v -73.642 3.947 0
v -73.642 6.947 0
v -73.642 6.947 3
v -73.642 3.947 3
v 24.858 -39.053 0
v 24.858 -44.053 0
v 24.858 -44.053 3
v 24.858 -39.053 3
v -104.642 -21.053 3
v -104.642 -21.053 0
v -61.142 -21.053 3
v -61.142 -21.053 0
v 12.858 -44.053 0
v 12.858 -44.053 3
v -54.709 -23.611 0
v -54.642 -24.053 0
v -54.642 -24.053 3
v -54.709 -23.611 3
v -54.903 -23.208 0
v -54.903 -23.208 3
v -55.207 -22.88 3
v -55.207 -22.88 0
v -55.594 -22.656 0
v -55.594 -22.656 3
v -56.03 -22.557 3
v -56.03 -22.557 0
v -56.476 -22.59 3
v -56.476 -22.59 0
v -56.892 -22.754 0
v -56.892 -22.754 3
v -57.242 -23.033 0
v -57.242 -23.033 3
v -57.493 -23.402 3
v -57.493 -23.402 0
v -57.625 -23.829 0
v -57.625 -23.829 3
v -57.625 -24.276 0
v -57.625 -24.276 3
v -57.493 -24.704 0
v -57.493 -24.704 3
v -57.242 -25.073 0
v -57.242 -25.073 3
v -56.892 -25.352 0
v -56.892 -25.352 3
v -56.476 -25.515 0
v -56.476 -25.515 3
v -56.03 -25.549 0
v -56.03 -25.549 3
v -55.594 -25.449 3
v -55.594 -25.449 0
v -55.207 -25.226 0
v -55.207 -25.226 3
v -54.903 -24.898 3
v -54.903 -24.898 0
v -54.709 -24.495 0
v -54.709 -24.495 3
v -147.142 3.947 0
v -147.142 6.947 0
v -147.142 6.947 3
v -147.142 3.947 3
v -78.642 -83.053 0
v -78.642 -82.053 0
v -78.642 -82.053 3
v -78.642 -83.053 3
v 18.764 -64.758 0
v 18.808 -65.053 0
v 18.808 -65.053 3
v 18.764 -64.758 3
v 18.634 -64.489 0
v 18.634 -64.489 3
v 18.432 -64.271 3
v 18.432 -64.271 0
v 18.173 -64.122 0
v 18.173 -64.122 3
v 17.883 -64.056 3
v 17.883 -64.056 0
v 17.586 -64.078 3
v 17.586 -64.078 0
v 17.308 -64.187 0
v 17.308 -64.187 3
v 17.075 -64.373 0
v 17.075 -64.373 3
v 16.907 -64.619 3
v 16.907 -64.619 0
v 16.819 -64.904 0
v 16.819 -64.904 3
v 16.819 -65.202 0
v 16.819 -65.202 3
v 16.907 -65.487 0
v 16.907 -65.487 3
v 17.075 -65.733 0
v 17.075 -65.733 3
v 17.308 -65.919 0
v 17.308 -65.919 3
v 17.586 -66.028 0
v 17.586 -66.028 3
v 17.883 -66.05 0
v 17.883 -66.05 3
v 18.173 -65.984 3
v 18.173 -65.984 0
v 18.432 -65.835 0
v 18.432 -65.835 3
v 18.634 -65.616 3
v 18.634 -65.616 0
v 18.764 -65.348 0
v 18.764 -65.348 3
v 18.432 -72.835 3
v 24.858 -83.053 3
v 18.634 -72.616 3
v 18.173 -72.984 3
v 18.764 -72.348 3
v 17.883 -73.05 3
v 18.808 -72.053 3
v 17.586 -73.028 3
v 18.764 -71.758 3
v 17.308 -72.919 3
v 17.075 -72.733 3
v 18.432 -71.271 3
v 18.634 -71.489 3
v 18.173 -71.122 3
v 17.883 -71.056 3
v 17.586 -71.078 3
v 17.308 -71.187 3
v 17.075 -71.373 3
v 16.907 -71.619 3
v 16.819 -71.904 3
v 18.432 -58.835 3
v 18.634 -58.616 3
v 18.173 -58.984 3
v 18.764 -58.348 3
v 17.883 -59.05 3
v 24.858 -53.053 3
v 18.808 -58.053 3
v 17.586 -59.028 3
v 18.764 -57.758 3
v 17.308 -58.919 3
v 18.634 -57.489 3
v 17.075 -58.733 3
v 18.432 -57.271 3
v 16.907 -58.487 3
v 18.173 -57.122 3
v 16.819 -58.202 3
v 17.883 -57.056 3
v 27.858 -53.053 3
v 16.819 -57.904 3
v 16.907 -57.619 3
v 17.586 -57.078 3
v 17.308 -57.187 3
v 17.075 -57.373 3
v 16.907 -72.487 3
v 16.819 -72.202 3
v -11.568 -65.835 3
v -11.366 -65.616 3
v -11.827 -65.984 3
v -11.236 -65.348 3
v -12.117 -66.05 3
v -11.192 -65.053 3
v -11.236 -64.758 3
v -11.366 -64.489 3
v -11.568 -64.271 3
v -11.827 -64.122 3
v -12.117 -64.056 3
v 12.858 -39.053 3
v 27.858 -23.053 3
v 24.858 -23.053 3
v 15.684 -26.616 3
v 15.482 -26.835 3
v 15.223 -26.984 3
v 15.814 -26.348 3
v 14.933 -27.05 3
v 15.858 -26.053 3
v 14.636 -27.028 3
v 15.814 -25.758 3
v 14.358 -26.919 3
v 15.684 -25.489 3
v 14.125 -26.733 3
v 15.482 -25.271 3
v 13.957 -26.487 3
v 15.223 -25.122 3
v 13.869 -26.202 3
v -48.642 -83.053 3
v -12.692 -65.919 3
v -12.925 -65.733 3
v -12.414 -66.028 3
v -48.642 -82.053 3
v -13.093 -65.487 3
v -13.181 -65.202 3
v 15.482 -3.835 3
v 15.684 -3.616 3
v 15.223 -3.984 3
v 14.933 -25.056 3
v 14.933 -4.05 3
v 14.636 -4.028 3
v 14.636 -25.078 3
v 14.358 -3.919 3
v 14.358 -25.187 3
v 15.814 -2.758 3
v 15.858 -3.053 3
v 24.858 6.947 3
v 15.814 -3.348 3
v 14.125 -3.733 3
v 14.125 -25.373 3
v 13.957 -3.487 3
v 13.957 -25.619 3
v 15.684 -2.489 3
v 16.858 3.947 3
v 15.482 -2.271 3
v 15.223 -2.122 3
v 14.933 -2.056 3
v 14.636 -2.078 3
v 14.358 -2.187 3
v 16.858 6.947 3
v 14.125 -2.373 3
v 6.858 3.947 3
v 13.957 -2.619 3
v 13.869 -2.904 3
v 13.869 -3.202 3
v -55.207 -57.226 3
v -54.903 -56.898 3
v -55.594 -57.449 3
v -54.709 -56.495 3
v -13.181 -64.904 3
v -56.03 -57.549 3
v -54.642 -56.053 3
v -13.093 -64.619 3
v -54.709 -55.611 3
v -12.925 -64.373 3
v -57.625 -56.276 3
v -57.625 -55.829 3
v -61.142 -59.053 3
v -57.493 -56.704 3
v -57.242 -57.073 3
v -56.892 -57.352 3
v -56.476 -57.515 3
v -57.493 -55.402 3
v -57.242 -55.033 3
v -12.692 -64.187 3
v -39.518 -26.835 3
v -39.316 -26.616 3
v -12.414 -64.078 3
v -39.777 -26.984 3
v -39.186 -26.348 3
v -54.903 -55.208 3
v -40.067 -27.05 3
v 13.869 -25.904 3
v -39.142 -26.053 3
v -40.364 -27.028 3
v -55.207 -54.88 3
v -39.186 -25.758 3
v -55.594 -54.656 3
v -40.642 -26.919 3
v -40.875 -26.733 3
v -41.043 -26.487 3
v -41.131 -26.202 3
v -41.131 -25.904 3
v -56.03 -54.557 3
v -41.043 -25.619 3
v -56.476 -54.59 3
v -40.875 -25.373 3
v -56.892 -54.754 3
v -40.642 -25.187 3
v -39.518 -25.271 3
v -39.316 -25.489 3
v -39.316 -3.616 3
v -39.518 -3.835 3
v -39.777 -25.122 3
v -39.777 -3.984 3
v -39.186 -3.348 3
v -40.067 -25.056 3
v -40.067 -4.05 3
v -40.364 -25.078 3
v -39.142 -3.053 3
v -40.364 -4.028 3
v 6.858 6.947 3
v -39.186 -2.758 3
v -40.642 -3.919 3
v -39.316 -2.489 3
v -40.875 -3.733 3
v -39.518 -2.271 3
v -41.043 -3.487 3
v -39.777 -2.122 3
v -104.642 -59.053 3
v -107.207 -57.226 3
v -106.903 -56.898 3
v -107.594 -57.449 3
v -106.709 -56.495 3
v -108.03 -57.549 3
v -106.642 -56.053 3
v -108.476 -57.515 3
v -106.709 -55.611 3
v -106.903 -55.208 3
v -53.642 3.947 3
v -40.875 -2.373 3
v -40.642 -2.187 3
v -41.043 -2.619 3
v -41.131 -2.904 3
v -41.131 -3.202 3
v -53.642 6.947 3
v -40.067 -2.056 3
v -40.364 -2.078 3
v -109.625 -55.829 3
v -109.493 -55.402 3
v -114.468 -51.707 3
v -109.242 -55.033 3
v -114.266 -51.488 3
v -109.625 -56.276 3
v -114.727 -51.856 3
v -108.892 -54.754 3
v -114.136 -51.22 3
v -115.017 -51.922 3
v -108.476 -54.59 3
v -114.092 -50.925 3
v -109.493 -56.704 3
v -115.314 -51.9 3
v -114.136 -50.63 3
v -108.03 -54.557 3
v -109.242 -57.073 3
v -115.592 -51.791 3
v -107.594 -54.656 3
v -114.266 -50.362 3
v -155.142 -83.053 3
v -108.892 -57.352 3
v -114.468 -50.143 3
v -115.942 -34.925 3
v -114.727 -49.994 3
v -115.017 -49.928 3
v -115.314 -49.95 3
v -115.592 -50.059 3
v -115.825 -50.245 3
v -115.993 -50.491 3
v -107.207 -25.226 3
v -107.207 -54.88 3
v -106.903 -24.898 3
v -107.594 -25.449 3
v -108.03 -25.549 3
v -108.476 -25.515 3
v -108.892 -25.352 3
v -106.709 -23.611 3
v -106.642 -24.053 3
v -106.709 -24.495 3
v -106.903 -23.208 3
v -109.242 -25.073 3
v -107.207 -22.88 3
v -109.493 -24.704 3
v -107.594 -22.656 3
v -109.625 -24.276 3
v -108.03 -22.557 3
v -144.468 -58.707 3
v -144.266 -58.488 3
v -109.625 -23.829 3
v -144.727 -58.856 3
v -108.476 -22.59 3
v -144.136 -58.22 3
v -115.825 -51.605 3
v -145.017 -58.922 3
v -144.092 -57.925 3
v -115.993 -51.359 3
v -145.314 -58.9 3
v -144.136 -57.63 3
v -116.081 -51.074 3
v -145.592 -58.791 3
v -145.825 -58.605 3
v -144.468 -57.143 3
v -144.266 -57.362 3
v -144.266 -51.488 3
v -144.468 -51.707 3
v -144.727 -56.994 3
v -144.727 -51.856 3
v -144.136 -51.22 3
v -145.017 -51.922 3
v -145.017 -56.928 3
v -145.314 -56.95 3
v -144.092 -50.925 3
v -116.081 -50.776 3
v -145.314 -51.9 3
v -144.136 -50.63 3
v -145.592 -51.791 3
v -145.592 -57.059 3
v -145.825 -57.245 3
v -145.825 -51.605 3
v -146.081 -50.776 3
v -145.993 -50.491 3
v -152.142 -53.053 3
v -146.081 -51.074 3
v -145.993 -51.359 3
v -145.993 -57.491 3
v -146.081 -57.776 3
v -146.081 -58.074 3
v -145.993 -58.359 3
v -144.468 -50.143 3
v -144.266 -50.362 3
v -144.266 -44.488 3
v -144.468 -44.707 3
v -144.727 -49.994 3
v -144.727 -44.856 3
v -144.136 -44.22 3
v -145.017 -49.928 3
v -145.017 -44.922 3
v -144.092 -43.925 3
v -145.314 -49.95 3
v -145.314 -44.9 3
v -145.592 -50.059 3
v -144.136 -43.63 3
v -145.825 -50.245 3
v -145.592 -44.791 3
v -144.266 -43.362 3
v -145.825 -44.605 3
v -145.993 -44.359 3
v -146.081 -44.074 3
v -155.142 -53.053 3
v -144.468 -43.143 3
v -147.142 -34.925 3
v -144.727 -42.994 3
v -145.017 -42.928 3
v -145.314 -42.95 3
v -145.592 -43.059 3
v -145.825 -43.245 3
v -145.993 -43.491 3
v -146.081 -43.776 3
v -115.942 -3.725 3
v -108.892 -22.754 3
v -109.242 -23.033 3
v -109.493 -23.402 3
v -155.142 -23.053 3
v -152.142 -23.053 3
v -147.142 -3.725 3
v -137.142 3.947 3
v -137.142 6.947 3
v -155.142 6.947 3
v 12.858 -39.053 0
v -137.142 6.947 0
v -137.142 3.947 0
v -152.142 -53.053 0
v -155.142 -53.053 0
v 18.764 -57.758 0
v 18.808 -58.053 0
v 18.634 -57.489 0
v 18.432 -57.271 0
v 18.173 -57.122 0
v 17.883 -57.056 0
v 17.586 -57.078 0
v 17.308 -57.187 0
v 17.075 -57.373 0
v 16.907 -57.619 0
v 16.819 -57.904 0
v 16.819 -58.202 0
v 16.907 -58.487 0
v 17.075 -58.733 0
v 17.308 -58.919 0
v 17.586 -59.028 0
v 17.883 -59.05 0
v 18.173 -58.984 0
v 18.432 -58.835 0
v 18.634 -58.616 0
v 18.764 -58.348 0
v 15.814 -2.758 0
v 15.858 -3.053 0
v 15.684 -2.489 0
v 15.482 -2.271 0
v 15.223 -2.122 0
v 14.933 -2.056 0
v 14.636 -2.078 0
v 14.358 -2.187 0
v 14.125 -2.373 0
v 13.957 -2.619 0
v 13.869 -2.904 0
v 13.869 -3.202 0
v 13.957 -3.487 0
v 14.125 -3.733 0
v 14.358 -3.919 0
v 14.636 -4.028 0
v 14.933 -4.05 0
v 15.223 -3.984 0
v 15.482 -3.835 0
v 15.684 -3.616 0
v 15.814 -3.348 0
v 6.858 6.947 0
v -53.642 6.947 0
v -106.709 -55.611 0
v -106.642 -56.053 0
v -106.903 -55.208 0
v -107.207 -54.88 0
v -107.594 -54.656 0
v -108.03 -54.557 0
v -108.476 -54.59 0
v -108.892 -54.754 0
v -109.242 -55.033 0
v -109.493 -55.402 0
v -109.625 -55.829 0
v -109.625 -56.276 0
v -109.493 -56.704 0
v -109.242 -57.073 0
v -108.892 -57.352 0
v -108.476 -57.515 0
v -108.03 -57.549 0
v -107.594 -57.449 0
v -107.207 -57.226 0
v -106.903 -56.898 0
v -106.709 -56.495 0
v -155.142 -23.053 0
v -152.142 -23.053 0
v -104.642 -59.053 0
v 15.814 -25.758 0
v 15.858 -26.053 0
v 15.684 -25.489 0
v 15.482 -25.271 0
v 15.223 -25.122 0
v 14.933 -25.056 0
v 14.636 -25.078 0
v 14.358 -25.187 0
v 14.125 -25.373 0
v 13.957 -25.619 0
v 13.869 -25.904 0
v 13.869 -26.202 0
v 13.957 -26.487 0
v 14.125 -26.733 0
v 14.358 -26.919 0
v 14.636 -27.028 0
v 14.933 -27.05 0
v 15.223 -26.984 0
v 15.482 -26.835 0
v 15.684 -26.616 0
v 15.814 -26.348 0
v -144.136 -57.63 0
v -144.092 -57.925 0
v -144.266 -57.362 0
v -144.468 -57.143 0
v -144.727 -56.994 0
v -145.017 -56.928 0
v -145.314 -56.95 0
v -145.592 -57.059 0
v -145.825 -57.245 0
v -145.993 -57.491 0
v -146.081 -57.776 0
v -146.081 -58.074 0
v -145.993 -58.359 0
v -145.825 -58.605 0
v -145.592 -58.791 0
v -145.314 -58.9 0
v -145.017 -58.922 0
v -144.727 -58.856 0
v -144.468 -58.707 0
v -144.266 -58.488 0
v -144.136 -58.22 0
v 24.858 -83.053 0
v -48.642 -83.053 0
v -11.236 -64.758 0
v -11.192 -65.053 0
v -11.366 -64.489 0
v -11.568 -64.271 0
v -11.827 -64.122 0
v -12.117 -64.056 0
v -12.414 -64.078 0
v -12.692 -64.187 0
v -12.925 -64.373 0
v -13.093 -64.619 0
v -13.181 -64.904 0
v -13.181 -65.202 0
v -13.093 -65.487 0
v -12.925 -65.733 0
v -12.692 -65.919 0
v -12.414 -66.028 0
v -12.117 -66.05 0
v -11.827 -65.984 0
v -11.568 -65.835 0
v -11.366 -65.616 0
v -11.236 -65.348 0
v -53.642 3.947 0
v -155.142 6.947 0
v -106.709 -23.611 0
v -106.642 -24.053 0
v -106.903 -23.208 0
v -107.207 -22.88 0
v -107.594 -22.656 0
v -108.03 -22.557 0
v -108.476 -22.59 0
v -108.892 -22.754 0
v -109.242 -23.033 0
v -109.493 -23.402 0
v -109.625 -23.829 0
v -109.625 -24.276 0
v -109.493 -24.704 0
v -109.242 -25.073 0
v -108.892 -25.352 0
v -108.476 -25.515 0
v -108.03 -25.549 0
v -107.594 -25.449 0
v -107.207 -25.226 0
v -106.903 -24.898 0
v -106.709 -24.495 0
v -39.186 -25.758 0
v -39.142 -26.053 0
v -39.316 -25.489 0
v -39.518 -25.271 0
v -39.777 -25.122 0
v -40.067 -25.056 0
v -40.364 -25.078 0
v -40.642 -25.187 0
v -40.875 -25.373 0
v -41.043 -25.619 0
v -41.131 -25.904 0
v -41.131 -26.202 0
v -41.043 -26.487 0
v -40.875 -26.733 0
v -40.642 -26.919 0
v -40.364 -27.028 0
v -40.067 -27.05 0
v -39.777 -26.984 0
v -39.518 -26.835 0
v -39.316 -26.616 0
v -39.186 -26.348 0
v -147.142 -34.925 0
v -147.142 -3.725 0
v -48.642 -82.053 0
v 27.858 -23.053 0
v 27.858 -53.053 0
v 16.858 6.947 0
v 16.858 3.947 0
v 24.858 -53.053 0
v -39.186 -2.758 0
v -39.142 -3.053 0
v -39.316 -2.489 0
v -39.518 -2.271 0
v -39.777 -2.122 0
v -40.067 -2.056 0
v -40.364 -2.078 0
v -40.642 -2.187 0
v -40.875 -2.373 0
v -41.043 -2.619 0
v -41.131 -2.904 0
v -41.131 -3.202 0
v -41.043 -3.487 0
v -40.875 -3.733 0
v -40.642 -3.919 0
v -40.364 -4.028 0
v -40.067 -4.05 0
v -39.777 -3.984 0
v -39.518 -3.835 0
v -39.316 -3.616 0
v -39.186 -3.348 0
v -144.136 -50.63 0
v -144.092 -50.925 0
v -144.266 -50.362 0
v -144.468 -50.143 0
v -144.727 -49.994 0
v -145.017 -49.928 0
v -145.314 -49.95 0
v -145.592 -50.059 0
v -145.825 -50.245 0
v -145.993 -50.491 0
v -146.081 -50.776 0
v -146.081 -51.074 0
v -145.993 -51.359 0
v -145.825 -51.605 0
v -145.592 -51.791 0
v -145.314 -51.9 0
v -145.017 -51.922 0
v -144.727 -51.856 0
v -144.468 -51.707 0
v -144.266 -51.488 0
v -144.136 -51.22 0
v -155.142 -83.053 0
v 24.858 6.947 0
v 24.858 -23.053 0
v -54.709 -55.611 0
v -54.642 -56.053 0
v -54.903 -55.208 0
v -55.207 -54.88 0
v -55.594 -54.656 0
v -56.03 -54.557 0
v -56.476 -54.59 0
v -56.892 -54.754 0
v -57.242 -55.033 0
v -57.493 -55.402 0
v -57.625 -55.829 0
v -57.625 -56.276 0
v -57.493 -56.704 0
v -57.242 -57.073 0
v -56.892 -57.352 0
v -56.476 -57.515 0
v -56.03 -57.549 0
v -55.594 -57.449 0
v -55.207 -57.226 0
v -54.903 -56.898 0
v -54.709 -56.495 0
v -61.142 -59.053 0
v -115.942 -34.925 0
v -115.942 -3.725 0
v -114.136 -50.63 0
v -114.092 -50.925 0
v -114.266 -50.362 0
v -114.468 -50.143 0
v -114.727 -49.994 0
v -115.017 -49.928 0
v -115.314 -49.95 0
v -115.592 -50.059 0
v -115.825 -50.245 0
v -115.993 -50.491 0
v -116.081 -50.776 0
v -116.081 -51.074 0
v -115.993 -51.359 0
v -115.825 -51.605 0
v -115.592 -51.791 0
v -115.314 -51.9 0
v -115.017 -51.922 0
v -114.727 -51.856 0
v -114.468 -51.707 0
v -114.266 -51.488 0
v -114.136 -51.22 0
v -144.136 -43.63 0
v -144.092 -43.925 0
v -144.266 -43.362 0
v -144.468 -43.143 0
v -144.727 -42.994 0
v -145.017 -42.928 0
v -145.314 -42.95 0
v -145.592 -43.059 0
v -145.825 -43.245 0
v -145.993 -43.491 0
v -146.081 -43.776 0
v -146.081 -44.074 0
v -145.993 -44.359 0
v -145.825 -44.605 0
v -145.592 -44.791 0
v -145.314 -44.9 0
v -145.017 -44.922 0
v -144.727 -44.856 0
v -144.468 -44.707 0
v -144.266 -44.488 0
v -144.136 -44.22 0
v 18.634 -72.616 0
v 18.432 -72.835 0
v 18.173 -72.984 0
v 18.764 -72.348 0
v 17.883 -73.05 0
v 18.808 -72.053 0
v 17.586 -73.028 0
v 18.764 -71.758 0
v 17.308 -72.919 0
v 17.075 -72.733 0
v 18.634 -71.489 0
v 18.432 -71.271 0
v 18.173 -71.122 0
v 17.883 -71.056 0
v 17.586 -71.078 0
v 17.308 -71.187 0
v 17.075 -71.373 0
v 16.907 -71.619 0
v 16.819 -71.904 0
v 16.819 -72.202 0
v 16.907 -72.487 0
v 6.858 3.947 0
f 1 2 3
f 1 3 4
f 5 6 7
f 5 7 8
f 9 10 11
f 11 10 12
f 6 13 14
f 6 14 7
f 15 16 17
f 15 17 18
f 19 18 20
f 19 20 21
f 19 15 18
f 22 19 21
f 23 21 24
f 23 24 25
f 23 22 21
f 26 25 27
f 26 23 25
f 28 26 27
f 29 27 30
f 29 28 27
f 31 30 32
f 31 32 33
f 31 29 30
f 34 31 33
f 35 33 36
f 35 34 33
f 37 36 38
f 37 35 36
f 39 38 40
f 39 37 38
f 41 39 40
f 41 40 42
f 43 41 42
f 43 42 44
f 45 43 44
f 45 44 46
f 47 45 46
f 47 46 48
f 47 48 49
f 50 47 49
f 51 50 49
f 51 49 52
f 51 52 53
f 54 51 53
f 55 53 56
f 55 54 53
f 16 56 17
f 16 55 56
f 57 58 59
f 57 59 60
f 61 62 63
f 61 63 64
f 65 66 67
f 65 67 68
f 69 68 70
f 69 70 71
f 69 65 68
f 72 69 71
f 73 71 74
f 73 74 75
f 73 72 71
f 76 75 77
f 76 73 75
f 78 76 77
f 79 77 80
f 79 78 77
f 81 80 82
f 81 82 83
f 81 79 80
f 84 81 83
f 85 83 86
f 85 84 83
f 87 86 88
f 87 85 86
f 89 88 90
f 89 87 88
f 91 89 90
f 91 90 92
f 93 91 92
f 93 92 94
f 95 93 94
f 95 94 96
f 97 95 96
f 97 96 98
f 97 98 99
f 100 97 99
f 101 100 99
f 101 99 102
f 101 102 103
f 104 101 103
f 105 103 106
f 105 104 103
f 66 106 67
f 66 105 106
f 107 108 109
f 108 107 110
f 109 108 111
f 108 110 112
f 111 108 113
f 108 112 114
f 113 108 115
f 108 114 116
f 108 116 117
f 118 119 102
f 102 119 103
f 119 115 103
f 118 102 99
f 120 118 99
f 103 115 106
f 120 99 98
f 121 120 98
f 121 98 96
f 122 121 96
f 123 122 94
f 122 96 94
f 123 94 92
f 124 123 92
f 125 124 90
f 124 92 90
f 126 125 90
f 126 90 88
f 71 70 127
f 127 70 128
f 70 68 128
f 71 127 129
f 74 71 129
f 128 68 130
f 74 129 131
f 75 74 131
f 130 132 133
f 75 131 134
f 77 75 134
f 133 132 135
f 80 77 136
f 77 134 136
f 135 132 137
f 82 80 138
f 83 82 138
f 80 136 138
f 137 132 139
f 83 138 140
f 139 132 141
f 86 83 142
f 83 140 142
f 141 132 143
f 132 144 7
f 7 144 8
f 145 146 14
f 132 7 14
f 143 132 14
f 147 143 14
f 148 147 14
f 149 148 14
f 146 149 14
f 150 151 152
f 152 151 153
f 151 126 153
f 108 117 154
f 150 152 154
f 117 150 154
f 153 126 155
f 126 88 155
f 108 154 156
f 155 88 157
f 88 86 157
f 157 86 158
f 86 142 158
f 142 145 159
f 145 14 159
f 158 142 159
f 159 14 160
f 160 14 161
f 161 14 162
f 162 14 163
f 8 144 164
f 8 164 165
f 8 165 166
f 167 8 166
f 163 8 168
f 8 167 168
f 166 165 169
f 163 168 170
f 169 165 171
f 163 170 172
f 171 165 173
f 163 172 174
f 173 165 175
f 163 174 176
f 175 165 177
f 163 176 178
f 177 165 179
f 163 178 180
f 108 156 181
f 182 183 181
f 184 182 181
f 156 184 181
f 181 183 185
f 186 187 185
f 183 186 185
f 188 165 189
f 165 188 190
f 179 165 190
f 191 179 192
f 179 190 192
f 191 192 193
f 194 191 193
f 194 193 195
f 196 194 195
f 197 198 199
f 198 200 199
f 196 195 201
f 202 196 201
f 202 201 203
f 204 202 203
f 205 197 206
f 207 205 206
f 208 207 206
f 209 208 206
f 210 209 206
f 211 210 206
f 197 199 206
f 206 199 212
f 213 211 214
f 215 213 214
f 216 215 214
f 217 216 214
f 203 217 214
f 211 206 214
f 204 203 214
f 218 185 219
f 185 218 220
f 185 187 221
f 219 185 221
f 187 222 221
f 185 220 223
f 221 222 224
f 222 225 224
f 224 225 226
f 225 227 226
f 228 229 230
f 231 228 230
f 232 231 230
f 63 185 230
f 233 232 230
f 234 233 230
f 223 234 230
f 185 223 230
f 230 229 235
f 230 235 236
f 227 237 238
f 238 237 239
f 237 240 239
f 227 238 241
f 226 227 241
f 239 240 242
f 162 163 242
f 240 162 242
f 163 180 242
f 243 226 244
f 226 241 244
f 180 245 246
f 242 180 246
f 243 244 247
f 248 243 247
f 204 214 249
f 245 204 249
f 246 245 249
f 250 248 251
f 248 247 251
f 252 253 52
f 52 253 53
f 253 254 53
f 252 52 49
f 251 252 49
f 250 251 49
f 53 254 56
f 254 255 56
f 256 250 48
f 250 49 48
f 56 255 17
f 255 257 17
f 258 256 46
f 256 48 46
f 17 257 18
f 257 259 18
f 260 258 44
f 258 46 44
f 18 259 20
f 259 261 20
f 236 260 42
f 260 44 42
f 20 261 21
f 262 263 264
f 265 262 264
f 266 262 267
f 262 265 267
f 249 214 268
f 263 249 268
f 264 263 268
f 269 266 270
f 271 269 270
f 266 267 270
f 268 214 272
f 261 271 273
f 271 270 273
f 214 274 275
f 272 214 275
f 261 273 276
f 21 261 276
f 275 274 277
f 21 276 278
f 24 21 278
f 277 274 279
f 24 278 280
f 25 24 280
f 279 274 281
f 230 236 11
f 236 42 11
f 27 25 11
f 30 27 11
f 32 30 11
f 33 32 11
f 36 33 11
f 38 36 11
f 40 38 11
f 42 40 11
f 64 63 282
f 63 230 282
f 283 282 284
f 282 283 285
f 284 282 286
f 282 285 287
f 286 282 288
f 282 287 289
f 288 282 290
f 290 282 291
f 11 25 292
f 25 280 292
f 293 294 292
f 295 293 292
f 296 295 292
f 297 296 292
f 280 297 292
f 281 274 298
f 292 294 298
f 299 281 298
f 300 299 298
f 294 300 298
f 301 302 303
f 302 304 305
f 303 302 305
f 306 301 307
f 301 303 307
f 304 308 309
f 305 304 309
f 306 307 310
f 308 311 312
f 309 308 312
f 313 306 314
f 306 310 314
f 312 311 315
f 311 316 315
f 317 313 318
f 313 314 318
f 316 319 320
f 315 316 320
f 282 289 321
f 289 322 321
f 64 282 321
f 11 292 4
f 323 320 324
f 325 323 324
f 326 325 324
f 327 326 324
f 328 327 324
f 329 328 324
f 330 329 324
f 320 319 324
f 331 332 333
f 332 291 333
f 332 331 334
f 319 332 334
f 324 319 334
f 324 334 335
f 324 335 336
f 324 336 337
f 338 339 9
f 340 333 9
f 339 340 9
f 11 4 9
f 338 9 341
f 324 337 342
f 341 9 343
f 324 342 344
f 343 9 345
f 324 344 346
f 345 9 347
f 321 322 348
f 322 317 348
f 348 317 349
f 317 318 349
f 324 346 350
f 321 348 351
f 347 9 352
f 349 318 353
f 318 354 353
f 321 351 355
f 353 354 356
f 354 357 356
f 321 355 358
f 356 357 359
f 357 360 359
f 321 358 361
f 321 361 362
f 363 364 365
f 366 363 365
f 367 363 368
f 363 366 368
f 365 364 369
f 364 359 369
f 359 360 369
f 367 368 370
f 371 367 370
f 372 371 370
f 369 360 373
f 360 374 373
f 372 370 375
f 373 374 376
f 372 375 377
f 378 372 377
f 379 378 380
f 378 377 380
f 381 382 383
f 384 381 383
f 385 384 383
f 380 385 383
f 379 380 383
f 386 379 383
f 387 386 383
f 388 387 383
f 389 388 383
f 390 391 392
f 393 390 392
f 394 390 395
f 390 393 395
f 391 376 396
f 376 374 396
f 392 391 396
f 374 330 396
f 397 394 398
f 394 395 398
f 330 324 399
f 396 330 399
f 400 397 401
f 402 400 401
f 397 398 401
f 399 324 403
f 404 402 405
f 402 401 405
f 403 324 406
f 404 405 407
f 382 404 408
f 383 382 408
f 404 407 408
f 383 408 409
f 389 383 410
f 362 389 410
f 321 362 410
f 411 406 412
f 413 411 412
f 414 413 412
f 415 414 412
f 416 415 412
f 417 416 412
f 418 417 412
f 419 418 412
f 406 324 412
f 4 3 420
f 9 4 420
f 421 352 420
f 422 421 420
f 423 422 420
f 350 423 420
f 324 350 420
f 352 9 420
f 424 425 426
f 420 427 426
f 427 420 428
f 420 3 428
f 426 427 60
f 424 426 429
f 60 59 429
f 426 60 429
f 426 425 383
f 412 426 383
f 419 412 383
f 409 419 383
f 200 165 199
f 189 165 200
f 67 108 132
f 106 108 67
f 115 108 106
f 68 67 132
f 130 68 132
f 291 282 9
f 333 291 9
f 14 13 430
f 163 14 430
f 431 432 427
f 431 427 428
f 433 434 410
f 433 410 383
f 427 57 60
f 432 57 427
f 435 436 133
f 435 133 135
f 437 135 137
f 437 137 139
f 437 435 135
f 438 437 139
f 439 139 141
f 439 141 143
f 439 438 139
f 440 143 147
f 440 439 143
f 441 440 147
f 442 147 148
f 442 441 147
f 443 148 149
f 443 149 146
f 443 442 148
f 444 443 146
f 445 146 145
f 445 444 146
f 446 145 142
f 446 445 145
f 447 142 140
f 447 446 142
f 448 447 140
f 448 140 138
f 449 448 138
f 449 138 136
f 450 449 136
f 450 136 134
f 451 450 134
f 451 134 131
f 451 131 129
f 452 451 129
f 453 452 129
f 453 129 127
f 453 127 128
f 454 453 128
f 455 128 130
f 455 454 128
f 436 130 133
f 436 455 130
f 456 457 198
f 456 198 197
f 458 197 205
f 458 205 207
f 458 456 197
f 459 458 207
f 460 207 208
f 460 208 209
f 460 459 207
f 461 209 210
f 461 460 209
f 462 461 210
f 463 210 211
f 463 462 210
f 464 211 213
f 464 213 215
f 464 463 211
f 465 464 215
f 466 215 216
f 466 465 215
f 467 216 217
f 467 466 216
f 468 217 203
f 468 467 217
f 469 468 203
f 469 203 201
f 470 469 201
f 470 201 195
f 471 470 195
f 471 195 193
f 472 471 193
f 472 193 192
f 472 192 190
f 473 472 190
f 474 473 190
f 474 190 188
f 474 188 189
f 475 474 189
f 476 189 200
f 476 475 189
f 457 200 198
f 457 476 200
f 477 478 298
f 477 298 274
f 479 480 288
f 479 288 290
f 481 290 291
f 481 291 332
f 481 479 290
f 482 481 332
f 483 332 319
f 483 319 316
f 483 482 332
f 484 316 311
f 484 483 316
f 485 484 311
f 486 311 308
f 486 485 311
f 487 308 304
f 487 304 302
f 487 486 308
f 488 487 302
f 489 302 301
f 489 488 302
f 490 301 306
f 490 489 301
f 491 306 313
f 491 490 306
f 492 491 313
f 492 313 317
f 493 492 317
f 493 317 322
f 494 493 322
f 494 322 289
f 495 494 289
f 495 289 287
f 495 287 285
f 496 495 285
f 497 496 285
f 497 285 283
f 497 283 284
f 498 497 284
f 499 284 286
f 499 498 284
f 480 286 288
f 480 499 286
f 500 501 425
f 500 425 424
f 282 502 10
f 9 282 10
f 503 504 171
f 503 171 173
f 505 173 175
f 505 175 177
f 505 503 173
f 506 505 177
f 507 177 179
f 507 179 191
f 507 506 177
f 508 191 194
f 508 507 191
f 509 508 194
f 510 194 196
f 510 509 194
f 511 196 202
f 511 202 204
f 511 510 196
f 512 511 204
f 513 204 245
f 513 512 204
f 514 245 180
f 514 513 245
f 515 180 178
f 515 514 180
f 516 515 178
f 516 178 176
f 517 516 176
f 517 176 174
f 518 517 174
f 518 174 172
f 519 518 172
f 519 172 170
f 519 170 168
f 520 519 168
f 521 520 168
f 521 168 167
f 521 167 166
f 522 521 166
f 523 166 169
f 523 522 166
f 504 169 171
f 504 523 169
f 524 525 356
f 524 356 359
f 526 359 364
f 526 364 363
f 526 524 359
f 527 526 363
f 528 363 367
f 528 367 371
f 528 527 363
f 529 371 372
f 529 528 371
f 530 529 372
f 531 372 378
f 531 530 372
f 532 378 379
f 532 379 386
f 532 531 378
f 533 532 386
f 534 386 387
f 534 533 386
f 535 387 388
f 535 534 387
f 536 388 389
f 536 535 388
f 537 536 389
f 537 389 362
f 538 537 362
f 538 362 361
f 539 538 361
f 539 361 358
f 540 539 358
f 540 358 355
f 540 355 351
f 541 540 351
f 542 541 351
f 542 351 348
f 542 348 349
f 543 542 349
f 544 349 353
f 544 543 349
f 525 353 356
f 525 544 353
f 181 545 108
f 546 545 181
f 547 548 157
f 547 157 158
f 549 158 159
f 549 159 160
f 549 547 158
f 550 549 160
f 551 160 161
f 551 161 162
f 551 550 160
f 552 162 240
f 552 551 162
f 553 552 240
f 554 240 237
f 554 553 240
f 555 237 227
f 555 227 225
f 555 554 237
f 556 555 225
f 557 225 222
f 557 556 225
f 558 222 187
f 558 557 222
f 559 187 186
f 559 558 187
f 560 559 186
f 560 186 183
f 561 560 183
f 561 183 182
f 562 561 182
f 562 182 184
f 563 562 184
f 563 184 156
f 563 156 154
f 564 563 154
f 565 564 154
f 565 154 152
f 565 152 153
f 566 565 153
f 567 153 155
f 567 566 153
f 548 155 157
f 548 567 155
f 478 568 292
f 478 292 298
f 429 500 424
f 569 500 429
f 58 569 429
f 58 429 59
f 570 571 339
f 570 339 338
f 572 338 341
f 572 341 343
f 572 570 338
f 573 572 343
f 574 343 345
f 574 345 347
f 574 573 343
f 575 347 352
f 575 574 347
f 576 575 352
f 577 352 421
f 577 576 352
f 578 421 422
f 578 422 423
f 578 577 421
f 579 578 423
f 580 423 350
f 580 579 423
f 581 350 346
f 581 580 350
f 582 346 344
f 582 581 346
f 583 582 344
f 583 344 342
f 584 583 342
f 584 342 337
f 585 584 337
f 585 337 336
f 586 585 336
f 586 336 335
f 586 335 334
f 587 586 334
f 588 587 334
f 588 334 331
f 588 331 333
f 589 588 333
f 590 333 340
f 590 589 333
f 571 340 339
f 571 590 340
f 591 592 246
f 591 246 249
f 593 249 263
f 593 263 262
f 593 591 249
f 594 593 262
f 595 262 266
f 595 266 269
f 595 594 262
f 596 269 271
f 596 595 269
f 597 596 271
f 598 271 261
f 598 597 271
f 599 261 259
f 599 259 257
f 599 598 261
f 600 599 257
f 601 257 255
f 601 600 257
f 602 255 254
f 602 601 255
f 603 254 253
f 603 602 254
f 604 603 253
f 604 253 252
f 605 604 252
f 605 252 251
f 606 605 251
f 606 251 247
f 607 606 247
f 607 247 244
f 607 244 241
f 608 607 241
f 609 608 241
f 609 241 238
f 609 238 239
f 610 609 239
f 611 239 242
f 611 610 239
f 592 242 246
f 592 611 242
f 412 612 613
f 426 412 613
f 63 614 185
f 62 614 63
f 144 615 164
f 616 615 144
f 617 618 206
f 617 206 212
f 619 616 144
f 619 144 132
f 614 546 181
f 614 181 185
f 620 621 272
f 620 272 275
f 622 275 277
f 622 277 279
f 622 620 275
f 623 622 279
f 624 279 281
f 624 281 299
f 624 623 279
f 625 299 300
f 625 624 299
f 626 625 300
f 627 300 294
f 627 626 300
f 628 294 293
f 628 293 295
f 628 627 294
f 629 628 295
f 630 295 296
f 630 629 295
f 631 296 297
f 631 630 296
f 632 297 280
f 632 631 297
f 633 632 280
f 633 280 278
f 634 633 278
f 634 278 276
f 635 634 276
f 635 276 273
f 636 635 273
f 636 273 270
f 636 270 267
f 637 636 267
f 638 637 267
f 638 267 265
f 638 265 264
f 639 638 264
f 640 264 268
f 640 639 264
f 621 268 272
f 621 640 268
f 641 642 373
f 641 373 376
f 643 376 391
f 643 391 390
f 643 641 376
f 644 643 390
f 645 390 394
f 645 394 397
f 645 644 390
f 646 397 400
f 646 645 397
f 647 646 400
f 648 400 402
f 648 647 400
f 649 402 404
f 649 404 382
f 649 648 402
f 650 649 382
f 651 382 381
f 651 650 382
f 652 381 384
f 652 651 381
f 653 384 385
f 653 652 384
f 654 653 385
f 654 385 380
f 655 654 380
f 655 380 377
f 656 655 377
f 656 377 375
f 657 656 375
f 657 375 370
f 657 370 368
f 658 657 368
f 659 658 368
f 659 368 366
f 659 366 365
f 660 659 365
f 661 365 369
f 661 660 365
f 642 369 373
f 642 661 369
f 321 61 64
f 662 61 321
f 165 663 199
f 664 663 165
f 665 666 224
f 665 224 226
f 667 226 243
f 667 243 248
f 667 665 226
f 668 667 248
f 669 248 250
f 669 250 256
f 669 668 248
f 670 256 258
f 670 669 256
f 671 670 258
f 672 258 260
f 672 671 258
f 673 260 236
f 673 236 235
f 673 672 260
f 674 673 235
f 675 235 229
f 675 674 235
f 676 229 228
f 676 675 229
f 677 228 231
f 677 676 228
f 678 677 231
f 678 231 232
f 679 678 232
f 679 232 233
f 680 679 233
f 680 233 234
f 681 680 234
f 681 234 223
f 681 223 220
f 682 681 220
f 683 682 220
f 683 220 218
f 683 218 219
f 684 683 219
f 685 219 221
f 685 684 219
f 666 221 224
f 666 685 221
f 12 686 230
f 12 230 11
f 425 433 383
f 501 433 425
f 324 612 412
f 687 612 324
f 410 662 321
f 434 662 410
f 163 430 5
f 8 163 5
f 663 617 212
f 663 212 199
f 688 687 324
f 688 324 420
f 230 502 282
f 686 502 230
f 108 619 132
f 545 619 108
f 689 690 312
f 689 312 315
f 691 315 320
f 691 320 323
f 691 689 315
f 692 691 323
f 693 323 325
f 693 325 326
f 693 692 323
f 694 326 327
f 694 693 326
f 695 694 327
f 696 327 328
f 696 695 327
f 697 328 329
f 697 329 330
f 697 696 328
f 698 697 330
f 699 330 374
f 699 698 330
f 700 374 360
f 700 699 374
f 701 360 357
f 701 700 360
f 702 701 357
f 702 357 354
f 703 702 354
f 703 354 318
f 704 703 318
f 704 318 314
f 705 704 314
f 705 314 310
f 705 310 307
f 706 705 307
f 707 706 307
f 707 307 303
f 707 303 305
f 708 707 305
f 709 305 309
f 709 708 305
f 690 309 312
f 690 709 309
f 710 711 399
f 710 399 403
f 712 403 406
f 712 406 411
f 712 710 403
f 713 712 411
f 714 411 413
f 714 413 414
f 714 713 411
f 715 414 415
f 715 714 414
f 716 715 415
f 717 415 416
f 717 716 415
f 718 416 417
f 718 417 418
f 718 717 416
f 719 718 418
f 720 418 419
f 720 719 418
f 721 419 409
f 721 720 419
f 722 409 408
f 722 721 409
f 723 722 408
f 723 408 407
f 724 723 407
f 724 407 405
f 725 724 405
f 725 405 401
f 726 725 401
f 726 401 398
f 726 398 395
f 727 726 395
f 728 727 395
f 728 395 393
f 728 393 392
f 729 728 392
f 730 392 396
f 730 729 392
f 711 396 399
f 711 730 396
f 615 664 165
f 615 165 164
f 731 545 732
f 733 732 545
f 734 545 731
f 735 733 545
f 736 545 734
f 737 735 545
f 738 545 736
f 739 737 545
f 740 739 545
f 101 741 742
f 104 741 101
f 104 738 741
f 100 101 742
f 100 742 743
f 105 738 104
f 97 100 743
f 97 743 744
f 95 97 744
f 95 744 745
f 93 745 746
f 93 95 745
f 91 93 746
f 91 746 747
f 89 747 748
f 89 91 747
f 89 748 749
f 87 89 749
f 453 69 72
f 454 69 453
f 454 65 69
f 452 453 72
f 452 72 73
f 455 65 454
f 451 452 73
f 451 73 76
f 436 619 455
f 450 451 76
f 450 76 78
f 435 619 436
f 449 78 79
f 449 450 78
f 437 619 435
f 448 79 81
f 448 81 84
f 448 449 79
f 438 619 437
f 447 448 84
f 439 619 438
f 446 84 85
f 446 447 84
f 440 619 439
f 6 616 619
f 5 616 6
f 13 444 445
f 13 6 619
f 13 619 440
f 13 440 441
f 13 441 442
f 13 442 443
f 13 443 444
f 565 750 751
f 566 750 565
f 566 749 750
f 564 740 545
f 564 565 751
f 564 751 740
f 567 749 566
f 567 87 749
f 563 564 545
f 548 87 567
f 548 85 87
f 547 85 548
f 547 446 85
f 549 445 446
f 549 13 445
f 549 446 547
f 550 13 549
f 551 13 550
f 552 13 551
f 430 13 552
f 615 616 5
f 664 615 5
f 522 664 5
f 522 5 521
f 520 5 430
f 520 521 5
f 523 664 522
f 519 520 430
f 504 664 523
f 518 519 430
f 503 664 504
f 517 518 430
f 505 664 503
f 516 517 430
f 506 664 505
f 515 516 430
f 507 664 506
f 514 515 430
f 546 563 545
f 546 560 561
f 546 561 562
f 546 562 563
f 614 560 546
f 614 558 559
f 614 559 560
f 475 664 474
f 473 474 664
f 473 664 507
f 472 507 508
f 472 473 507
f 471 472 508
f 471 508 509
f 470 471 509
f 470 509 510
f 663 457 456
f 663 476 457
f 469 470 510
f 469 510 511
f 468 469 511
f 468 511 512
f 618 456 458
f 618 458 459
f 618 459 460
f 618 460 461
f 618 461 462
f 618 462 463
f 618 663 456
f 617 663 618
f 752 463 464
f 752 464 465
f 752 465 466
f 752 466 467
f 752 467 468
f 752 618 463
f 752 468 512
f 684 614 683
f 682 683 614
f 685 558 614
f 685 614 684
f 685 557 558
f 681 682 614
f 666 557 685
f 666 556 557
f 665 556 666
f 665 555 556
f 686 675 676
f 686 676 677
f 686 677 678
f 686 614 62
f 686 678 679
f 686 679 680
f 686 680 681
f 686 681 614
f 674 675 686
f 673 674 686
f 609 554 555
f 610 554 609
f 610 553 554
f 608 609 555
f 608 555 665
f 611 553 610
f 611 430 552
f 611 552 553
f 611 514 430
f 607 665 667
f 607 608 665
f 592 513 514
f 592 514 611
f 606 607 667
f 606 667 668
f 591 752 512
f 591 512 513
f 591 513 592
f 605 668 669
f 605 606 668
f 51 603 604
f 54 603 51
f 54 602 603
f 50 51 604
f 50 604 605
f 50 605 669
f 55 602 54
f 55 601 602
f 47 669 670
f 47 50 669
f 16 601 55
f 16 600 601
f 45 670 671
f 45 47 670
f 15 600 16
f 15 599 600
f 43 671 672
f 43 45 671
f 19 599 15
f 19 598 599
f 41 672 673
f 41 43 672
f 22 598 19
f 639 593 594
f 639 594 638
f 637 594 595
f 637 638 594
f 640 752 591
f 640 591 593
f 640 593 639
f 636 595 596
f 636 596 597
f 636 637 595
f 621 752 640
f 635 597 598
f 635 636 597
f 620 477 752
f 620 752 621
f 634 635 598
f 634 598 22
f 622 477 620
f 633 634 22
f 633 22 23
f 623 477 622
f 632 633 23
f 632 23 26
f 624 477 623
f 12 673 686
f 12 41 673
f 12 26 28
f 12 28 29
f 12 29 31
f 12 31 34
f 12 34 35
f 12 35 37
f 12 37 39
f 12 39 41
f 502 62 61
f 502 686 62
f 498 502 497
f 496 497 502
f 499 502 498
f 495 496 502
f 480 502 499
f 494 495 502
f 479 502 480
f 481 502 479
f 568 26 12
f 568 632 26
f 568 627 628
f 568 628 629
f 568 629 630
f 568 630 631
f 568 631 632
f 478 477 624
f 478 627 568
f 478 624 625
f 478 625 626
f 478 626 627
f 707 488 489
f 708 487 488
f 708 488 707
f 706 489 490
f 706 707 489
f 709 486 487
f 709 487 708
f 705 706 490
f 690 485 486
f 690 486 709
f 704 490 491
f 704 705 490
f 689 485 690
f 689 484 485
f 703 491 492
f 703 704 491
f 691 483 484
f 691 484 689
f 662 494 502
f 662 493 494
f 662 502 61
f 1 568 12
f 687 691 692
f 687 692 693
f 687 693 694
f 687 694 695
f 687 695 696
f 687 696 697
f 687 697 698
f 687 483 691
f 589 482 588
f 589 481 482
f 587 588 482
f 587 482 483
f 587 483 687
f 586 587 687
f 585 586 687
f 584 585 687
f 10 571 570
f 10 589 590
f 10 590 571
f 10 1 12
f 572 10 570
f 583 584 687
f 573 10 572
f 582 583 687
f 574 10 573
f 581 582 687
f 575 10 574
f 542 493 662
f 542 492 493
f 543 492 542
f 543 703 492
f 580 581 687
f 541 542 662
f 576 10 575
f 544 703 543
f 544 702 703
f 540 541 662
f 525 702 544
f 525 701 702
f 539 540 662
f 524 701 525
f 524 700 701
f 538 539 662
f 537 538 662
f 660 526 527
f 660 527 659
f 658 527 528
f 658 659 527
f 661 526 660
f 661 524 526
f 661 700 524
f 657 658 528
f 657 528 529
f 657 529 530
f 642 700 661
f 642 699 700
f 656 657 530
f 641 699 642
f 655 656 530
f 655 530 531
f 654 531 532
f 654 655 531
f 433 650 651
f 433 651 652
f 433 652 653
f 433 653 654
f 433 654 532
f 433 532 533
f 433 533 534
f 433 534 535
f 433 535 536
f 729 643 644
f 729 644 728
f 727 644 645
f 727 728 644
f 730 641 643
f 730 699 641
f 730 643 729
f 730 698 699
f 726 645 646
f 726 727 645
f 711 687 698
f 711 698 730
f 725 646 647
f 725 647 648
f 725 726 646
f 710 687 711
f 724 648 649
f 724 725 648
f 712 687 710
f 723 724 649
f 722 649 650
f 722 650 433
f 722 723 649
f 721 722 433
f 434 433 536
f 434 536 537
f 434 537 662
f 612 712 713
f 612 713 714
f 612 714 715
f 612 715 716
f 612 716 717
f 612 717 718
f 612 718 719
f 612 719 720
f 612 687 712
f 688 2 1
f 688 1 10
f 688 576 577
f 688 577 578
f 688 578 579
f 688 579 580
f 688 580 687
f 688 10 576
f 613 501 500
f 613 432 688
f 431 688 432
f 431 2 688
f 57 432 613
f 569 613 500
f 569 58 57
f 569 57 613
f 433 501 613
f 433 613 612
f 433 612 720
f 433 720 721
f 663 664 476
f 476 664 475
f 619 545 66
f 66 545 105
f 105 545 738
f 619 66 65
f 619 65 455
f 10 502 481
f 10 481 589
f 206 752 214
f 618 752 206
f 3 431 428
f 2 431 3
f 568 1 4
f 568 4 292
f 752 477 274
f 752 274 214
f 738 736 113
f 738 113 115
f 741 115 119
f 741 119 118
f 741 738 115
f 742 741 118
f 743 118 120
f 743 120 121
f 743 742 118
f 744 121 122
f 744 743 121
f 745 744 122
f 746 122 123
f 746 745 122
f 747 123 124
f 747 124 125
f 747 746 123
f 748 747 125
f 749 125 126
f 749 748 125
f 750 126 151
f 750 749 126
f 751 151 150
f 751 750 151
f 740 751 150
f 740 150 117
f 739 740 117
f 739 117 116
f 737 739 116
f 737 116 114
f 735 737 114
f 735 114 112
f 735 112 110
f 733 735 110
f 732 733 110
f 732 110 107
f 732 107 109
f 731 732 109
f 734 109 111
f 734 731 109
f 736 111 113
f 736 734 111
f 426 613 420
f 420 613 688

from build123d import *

# Parameters (mm, degrees)
MODEL_R             = 1
MODEL_R_2           = 1.5
MODEL_W             = 31.2
MODEL_H             = 31.2
MODEL_W_2           = 12
MODEL_H_2           = 5
MODEL_W_3           = 43.5
MODEL_H_3           = 38
BOSS_EXTRUDE1_DEPTH = 3


with BuildPart() as part:
    # Model → Boss-Extrude1 (new body)
    with BuildSketch(Plane.XY):
        Polygon((-155.141927583, -53.052781364), (-152.141927583, -53.052781364), (-152.141927583, -23.052781364), (-155.141927583, -23.052781364), (-155.141927583, 6.947218636), (-147.141927583, 6.947218636), (-147.141927583, 3.947218636), (-137.141927583, 3.947218636), (-137.141927583, 6.947218636), (-73.641927583, 6.947218636), (-73.641927583, 3.947218636), (-53.641927583, 3.947218636), (-53.641927583, 6.947218636), (6.858072417, 6.947218636), (6.858072417, 3.947218636), (16.858072417, 3.947218636), (16.858072417, 6.947218636), (24.858072417, 6.947218636), (24.858072417, -23.052781364), (27.858072417, -23.052781364), (27.858072417, -53.052781364), (24.858072417, -53.052781364), (24.858072417, -83.052781364), (-48.641927583, -83.052781364), (-48.641927583, -82.052781364), (-78.641927583, -82.052781364), (-78.641927583, -83.052781364), (-155.141927583, -83.052781364), align=None)
        with Locations((-145.091927583, -50.925083063)):
            Circle(MODEL_R, mode=Mode.SUBTRACT)
        with Locations((-115.091927583, -50.925083063)):
            Circle(MODEL_R, mode=Mode.SUBTRACT)
        with Locations((17.808072417, -65.052781364)):
            Circle(MODEL_R, mode=Mode.SUBTRACT)
        with Locations((-12.191927583, -65.052781364)):
            Circle(MODEL_R, mode=Mode.SUBTRACT)
        with Locations((-108.141927583, -24.052781364)):
            Circle(MODEL_R_2, mode=Mode.SUBTRACT)
        with Locations((-56.141927583, -24.052781364)):
            Circle(MODEL_R_2, mode=Mode.SUBTRACT)
        with Locations((-56.141927583, -56.052781364)):
            Circle(MODEL_R_2, mode=Mode.SUBTRACT)
        with Locations((-108.141927583, -56.052781364)):
            Circle(MODEL_R_2, mode=Mode.SUBTRACT)
        with Locations((17.808072417, -72.052781364)):
            Circle(MODEL_R, mode=Mode.SUBTRACT)
        with Locations((17.808072417, -58.052781364)):
            Circle(MODEL_R, mode=Mode.SUBTRACT)
        with Locations((-145.091927583, -43.925083063)):
            Circle(MODEL_R, mode=Mode.SUBTRACT)
        with Locations((-145.091927583, -57.925083063)):
            Circle(MODEL_R, mode=Mode.SUBTRACT)
        with Locations((-40.141927583, -26.052781364)):
            Circle(MODEL_R, mode=Mode.SUBTRACT)
        with Locations((14.858072417, -26.052781364)):
            Circle(MODEL_R, mode=Mode.SUBTRACT)
        with Locations((-40.141927583, -3.052781364)):
            Circle(MODEL_R, mode=Mode.SUBTRACT)
        with Locations((14.858072417, -3.052781364)):
            Circle(MODEL_R, mode=Mode.SUBTRACT)
        with Locations((-131.541927583, -19.325083063)):
            Rectangle(MODEL_W, MODEL_H, mode=Mode.SUBTRACT)
        with Locations((18.858072417, -41.552781364)):
            Rectangle(MODEL_W_2, MODEL_H_2, mode=Mode.SUBTRACT)
        with Locations((-82.891927583, -40.052781364)):
            Rectangle(MODEL_W_3, MODEL_H_3, mode=Mode.SUBTRACT)
    extrude(amount=BOSS_EXTRUDE1_DEPTH)


solid = part.part
